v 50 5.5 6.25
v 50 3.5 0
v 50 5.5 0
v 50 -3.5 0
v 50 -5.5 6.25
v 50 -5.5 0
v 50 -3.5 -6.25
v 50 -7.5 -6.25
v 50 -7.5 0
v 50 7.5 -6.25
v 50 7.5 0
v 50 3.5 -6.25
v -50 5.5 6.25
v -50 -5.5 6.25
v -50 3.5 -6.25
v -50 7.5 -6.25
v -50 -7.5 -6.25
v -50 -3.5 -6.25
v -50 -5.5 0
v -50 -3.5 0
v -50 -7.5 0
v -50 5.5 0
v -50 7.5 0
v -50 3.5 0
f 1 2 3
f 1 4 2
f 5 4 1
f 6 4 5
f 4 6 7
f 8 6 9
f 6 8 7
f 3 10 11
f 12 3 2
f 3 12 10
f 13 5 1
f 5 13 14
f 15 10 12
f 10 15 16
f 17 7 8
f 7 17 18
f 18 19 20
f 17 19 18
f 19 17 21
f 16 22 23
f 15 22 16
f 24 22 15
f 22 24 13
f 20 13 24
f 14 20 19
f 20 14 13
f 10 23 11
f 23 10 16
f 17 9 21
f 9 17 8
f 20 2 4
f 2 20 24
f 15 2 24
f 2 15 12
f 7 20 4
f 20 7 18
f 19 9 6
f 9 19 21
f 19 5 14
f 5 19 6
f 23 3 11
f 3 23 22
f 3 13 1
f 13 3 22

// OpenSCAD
module linear_guide_rail() {
    difference() {
        // Main body of the rail
        translate([-50, -7.5, -6.25])
            cube([100, 15, 12.5]);

        // Cut out the rail groove
        translate([-50, -3.5, -6.25])
            cube([100, 7, 6.25]);

        // Cut out the side grooves
        translate([-50, -7.5, 0])
            cube([100, 2, 6.25]);
        translate([-50, 5.5, 0])
            cube([100, 2, 6.25]);
    }
}

linear_guide_rail();
